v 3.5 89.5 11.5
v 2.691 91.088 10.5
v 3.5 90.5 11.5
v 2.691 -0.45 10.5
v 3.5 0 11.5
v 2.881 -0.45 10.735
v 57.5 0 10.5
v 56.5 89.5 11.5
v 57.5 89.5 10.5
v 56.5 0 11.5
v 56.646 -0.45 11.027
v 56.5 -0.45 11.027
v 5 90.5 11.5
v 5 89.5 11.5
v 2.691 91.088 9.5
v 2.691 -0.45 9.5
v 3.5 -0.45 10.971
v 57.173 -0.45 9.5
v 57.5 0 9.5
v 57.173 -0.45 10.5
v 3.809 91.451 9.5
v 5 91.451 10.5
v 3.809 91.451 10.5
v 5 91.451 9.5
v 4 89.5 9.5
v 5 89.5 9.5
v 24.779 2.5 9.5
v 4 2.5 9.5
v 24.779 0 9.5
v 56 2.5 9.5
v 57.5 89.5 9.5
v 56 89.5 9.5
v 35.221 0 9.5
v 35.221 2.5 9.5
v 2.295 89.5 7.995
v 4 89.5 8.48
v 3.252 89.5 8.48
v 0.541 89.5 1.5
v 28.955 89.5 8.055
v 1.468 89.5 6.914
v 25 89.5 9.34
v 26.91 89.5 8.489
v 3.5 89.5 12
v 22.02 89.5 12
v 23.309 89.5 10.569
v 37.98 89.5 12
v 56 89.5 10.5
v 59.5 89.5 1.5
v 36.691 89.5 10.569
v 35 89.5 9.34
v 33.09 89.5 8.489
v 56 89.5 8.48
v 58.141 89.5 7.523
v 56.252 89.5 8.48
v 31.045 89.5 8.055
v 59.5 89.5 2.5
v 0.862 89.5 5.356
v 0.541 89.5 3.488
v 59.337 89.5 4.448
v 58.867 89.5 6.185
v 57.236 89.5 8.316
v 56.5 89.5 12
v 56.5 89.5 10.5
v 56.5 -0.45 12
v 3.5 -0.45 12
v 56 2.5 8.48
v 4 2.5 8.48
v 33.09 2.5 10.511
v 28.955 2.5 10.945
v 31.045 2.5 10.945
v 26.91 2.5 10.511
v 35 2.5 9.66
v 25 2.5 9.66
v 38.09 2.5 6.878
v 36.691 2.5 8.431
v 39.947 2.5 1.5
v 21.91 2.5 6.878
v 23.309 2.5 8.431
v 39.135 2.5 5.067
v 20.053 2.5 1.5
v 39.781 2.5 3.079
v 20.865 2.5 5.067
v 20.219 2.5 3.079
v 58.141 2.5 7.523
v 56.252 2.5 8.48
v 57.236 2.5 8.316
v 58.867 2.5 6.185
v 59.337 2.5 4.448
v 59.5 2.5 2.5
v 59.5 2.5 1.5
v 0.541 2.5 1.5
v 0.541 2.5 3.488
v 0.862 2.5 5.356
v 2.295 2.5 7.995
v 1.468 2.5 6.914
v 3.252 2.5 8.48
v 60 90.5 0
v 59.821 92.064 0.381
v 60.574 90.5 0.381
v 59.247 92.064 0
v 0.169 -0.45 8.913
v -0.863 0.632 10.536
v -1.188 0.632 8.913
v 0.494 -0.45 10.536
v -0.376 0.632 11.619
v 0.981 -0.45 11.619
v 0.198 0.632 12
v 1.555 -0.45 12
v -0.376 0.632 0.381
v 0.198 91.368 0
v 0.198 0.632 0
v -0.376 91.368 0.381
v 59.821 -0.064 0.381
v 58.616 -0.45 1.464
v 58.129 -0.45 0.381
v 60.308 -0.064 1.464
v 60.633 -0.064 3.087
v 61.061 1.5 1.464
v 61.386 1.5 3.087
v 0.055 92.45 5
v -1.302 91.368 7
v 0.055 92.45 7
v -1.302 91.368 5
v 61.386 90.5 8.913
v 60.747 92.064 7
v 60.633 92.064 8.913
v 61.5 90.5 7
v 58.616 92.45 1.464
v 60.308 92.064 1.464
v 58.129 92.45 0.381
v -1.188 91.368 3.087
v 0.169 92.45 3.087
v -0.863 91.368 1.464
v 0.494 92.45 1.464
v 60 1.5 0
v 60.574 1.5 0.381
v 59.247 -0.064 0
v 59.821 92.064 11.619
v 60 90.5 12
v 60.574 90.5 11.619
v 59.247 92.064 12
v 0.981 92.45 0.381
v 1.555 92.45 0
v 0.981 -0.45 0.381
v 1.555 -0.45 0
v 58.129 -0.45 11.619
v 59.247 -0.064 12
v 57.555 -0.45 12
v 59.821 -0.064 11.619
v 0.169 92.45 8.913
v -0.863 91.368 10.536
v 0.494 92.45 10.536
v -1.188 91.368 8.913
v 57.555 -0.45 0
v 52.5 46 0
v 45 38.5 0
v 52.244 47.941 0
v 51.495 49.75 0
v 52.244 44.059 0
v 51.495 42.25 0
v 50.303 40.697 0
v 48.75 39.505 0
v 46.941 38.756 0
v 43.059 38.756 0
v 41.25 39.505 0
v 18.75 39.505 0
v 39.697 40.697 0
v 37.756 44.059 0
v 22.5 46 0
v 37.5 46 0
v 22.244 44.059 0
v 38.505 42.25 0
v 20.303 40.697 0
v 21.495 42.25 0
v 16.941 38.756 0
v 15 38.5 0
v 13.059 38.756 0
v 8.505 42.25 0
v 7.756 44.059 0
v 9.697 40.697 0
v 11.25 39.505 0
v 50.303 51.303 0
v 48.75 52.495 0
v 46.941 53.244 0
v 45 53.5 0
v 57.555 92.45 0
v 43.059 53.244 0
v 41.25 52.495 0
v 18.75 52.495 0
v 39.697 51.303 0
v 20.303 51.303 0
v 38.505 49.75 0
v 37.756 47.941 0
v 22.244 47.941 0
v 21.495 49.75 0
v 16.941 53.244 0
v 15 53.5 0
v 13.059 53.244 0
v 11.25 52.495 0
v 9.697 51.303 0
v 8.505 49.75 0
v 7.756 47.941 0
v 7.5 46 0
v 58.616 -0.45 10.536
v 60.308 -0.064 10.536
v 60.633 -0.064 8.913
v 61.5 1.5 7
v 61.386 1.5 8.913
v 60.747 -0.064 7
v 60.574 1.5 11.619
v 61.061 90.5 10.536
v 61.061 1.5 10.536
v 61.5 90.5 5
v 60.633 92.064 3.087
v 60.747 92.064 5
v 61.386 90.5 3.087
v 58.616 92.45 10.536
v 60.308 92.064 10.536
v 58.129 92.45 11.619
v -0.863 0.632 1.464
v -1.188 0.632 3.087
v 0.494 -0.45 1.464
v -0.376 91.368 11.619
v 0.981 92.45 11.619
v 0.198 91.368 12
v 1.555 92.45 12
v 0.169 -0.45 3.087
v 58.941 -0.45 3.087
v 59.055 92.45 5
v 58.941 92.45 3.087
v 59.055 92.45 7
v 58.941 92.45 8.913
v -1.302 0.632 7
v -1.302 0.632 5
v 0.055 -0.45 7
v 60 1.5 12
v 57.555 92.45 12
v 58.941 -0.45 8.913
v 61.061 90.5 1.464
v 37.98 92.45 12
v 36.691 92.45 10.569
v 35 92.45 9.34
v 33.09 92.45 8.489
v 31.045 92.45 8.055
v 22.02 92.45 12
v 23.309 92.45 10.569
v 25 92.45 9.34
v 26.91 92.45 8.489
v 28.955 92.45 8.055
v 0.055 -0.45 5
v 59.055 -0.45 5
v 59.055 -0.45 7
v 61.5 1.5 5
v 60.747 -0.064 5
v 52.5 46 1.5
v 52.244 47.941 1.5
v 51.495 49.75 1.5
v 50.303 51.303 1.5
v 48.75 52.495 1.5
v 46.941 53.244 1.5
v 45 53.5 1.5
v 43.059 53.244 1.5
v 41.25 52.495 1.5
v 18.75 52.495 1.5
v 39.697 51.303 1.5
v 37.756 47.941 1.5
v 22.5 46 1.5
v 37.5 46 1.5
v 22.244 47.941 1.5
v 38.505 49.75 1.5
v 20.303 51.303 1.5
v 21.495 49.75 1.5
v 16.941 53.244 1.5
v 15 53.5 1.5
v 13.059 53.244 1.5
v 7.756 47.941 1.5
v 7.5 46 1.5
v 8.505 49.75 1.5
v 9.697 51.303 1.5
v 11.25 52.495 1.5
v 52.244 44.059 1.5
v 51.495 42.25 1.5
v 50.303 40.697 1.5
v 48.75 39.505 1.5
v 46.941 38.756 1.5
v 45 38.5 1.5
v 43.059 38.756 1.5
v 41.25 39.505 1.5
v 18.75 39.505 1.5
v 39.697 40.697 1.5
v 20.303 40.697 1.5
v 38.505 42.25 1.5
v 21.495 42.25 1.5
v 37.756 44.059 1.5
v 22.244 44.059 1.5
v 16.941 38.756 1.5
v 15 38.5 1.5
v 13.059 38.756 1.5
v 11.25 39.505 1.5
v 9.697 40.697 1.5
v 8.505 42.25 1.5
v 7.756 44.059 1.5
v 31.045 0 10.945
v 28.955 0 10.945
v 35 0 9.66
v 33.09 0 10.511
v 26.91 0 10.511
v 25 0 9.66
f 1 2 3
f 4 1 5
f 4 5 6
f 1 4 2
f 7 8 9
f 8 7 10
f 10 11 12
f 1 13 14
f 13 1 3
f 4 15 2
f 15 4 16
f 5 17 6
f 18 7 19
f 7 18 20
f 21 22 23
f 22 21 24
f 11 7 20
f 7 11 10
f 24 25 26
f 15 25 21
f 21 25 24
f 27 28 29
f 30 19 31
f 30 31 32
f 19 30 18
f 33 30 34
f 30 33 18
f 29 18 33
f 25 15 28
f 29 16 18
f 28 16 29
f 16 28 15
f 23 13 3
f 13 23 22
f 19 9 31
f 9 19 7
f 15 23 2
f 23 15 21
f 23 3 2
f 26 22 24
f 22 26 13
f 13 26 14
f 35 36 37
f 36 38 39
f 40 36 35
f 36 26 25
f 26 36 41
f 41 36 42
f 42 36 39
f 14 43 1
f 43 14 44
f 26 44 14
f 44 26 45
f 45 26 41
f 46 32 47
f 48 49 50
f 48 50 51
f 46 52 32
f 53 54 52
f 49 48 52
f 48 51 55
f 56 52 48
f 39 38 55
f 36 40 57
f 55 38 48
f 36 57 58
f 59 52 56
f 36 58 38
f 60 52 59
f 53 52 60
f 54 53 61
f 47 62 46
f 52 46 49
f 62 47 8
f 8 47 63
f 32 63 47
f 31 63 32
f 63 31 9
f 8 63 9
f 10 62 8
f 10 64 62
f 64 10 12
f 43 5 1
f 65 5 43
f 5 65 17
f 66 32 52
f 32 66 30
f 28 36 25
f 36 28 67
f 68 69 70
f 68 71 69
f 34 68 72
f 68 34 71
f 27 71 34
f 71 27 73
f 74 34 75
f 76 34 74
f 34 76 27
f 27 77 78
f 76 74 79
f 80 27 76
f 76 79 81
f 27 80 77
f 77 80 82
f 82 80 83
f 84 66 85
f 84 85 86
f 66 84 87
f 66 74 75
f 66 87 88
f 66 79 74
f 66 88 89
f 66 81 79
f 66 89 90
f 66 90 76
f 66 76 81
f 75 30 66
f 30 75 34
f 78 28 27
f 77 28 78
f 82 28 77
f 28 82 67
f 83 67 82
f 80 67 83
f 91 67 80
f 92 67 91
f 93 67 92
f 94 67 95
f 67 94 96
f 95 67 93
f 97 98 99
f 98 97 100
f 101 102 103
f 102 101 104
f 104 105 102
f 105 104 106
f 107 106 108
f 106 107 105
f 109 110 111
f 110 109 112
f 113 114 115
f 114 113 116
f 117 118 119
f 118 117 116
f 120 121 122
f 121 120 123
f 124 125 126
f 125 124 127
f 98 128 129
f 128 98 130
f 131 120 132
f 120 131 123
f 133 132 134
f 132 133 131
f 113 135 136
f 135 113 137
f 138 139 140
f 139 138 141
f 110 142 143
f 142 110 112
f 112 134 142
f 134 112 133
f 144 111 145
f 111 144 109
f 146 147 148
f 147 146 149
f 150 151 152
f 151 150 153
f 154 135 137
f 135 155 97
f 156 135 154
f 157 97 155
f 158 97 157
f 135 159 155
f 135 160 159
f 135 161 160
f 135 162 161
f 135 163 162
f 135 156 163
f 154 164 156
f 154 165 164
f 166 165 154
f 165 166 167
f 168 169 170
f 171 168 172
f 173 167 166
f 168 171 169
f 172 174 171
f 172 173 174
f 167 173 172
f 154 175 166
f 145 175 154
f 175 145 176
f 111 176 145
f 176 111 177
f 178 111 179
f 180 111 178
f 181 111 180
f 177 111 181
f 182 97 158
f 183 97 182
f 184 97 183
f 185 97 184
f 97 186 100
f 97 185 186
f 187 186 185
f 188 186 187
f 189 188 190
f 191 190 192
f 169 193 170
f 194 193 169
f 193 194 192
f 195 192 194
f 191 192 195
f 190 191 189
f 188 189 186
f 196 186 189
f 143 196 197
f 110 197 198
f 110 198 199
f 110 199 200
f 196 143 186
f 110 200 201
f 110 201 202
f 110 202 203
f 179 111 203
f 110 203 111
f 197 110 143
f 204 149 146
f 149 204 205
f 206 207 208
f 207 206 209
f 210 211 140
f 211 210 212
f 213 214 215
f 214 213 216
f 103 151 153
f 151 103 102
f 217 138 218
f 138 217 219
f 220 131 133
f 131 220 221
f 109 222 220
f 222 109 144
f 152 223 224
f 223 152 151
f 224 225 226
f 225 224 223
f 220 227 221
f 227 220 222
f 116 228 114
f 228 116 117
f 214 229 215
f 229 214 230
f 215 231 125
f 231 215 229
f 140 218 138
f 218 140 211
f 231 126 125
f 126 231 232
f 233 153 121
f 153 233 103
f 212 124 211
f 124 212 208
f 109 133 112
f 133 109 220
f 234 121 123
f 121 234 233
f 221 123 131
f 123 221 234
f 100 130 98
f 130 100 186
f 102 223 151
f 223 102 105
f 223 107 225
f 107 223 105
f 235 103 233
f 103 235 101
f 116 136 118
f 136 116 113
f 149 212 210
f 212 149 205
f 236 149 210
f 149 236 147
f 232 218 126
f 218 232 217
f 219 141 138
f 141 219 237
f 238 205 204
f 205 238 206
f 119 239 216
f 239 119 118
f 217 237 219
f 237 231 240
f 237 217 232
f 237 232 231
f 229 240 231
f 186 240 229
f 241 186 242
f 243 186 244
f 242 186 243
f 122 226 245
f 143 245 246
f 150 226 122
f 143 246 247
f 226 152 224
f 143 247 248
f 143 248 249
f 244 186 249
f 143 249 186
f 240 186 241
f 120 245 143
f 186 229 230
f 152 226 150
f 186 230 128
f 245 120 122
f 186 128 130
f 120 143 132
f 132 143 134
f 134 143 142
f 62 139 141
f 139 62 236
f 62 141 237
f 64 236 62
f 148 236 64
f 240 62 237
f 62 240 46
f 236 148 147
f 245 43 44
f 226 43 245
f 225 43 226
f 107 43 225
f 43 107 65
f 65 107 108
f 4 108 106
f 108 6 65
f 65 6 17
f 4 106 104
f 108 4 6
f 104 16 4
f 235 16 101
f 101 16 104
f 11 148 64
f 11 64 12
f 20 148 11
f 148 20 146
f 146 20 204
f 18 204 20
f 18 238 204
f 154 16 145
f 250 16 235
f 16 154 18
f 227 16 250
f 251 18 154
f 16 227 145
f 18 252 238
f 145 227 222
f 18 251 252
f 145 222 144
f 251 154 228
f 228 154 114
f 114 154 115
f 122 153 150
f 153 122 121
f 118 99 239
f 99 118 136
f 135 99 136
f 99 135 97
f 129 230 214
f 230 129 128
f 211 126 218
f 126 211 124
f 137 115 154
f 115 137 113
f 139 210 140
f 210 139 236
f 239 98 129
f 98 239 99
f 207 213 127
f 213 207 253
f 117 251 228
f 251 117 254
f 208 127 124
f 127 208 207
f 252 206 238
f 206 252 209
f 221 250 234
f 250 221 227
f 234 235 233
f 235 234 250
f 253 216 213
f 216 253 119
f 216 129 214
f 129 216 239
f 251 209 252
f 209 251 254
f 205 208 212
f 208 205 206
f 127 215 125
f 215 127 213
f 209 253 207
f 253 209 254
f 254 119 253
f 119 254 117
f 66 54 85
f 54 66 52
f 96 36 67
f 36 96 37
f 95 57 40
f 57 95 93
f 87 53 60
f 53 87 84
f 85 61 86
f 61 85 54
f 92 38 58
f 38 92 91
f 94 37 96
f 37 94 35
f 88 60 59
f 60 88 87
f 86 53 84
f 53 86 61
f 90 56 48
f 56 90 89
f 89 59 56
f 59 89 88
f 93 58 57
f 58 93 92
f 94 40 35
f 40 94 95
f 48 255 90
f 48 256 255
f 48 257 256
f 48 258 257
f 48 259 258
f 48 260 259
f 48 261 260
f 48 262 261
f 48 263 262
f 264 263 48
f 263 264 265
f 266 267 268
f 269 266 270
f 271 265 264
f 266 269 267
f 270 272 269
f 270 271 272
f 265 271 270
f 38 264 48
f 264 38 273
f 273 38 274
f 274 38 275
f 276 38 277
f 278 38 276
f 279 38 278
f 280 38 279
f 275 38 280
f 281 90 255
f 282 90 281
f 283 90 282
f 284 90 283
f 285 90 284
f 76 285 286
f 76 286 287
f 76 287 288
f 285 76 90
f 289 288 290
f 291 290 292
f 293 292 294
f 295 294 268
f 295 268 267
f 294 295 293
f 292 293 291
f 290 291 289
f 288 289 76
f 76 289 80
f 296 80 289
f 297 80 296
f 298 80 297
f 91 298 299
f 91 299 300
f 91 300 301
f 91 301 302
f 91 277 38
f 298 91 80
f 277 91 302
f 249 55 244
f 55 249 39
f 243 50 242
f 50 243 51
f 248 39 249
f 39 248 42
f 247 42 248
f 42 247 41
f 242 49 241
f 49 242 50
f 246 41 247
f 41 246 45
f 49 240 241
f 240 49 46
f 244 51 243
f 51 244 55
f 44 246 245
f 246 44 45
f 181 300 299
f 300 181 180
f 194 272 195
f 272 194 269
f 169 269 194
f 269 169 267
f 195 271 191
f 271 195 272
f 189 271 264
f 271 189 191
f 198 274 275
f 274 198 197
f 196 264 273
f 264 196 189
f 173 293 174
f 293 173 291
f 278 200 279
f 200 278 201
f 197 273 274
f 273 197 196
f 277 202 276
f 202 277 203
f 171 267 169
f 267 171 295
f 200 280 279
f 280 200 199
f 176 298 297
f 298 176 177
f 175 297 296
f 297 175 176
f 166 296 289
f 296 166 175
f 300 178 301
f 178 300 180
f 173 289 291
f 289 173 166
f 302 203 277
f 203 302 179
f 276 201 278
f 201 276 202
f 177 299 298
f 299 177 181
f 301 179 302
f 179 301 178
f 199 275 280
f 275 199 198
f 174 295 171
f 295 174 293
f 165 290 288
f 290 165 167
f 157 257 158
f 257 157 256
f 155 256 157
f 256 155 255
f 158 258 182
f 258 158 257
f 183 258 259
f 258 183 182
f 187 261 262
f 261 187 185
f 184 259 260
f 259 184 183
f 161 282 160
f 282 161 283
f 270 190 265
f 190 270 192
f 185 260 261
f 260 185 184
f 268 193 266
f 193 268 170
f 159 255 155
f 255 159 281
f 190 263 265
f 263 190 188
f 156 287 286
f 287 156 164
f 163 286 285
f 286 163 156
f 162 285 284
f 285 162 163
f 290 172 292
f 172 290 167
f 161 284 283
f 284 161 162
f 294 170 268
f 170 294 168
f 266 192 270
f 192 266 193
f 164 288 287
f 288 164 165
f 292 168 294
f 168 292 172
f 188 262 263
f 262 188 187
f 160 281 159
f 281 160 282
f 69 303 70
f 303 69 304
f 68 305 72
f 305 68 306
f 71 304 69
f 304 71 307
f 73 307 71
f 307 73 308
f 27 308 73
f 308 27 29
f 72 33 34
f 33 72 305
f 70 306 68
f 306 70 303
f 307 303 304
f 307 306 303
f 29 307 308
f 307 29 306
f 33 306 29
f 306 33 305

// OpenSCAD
card_length = 87;
card_width = 55; 
height = 12;

head_thickness = 2.5;
side_thickness = 2.5;
base_thickness = 1.5;

finger_hole_dia = 15;

module base() {
	translate([2, head_thickness, height/2-1])

	minkowski() {

	// is now 2 mm high
	minkowski() {
	 	cube([card_width-4+side_thickness*2, card_length-4+head_thickness*2, 1]);	    
		cylinder(r=2, h=1);
	}

	scale([0.3,1,1])
	rotate([90, 0, 0])
	cylinder(r=(height-2)/2, h=1);

	}
}

module inner_cutout() {

difference() {
	translate([1, 1-(head_thickness+1), height-4])
	minkowski() {
		cube([card_width-2, card_length+head_thickness+1, 1]);
		cylinder(r1=1, r2=0, h=1);
	} 

// fill one part again, why 2.5??
translate([side_thickness, head_thickness+card_length-2.5, 0])
cube([card_width, head_thickness, height]);
}

	translate([1, -(head_thickness+1), height-3])
	cube([card_width-2, card_length+head_thickness+1, 5]);

	translate([1.5, 0, base_thickness])
	cube([card_width-3, card_length, height-base_thickness-3]);

}


module part() {



difference() {
	base();

	translate([side_thickness, head_thickness, base_thickness])
	inner_cutout();
}

}

difference() {

// main part
part();

// half cylinder cup
translate([1+side_thickness, head_thickness, base_thickness])
difference() {
minkowski() {
	cube([card_width-2, card_length-1, 1]);

	scale([3/(height-base_thickness-4.5),1,1])
	rotate([-90, 0, 0])
	cylinder(r=(height-base_thickness-4.5), h=1);
}
translate([-500, -500, -1000])
cube([1000, 1000, 1000]);
}

// Finger thing on top
translate([card_width/2+side_thickness, card_length+2*head_thickness+1, height+6])
rotate([90, 0, 0])
cylinder(r=10, h=10);


// Finger holes on bottom
/*translate([card_width/2+side_thickness, 20, -1])
cylinder(r=finger_hole_dia/2, h=10);

translate([card_width/2+side_thickness, (card_length+2*head_thickness)-20, -1])
cylinder(r=finger_hole_dia/2, h=10); */

translate([15, card_length/2+head_thickness, -1])
cylinder(r=finger_hole_dia/2, h=10);

translate([(card_width+2*side_thickness)-15, card_length/2+head_thickness, -1])
cylinder(r=finger_hole_dia/2, h=10);

}

difference() {

translate([card_width/2+side_thickness, 0, height-11])
rotate([-90,0,0])
cylinder(r=10, h=head_thickness);

translate([-500, -500, -1000])
cube([1000, 1000, 1000]);

}
//cube([10, 10, height]);
